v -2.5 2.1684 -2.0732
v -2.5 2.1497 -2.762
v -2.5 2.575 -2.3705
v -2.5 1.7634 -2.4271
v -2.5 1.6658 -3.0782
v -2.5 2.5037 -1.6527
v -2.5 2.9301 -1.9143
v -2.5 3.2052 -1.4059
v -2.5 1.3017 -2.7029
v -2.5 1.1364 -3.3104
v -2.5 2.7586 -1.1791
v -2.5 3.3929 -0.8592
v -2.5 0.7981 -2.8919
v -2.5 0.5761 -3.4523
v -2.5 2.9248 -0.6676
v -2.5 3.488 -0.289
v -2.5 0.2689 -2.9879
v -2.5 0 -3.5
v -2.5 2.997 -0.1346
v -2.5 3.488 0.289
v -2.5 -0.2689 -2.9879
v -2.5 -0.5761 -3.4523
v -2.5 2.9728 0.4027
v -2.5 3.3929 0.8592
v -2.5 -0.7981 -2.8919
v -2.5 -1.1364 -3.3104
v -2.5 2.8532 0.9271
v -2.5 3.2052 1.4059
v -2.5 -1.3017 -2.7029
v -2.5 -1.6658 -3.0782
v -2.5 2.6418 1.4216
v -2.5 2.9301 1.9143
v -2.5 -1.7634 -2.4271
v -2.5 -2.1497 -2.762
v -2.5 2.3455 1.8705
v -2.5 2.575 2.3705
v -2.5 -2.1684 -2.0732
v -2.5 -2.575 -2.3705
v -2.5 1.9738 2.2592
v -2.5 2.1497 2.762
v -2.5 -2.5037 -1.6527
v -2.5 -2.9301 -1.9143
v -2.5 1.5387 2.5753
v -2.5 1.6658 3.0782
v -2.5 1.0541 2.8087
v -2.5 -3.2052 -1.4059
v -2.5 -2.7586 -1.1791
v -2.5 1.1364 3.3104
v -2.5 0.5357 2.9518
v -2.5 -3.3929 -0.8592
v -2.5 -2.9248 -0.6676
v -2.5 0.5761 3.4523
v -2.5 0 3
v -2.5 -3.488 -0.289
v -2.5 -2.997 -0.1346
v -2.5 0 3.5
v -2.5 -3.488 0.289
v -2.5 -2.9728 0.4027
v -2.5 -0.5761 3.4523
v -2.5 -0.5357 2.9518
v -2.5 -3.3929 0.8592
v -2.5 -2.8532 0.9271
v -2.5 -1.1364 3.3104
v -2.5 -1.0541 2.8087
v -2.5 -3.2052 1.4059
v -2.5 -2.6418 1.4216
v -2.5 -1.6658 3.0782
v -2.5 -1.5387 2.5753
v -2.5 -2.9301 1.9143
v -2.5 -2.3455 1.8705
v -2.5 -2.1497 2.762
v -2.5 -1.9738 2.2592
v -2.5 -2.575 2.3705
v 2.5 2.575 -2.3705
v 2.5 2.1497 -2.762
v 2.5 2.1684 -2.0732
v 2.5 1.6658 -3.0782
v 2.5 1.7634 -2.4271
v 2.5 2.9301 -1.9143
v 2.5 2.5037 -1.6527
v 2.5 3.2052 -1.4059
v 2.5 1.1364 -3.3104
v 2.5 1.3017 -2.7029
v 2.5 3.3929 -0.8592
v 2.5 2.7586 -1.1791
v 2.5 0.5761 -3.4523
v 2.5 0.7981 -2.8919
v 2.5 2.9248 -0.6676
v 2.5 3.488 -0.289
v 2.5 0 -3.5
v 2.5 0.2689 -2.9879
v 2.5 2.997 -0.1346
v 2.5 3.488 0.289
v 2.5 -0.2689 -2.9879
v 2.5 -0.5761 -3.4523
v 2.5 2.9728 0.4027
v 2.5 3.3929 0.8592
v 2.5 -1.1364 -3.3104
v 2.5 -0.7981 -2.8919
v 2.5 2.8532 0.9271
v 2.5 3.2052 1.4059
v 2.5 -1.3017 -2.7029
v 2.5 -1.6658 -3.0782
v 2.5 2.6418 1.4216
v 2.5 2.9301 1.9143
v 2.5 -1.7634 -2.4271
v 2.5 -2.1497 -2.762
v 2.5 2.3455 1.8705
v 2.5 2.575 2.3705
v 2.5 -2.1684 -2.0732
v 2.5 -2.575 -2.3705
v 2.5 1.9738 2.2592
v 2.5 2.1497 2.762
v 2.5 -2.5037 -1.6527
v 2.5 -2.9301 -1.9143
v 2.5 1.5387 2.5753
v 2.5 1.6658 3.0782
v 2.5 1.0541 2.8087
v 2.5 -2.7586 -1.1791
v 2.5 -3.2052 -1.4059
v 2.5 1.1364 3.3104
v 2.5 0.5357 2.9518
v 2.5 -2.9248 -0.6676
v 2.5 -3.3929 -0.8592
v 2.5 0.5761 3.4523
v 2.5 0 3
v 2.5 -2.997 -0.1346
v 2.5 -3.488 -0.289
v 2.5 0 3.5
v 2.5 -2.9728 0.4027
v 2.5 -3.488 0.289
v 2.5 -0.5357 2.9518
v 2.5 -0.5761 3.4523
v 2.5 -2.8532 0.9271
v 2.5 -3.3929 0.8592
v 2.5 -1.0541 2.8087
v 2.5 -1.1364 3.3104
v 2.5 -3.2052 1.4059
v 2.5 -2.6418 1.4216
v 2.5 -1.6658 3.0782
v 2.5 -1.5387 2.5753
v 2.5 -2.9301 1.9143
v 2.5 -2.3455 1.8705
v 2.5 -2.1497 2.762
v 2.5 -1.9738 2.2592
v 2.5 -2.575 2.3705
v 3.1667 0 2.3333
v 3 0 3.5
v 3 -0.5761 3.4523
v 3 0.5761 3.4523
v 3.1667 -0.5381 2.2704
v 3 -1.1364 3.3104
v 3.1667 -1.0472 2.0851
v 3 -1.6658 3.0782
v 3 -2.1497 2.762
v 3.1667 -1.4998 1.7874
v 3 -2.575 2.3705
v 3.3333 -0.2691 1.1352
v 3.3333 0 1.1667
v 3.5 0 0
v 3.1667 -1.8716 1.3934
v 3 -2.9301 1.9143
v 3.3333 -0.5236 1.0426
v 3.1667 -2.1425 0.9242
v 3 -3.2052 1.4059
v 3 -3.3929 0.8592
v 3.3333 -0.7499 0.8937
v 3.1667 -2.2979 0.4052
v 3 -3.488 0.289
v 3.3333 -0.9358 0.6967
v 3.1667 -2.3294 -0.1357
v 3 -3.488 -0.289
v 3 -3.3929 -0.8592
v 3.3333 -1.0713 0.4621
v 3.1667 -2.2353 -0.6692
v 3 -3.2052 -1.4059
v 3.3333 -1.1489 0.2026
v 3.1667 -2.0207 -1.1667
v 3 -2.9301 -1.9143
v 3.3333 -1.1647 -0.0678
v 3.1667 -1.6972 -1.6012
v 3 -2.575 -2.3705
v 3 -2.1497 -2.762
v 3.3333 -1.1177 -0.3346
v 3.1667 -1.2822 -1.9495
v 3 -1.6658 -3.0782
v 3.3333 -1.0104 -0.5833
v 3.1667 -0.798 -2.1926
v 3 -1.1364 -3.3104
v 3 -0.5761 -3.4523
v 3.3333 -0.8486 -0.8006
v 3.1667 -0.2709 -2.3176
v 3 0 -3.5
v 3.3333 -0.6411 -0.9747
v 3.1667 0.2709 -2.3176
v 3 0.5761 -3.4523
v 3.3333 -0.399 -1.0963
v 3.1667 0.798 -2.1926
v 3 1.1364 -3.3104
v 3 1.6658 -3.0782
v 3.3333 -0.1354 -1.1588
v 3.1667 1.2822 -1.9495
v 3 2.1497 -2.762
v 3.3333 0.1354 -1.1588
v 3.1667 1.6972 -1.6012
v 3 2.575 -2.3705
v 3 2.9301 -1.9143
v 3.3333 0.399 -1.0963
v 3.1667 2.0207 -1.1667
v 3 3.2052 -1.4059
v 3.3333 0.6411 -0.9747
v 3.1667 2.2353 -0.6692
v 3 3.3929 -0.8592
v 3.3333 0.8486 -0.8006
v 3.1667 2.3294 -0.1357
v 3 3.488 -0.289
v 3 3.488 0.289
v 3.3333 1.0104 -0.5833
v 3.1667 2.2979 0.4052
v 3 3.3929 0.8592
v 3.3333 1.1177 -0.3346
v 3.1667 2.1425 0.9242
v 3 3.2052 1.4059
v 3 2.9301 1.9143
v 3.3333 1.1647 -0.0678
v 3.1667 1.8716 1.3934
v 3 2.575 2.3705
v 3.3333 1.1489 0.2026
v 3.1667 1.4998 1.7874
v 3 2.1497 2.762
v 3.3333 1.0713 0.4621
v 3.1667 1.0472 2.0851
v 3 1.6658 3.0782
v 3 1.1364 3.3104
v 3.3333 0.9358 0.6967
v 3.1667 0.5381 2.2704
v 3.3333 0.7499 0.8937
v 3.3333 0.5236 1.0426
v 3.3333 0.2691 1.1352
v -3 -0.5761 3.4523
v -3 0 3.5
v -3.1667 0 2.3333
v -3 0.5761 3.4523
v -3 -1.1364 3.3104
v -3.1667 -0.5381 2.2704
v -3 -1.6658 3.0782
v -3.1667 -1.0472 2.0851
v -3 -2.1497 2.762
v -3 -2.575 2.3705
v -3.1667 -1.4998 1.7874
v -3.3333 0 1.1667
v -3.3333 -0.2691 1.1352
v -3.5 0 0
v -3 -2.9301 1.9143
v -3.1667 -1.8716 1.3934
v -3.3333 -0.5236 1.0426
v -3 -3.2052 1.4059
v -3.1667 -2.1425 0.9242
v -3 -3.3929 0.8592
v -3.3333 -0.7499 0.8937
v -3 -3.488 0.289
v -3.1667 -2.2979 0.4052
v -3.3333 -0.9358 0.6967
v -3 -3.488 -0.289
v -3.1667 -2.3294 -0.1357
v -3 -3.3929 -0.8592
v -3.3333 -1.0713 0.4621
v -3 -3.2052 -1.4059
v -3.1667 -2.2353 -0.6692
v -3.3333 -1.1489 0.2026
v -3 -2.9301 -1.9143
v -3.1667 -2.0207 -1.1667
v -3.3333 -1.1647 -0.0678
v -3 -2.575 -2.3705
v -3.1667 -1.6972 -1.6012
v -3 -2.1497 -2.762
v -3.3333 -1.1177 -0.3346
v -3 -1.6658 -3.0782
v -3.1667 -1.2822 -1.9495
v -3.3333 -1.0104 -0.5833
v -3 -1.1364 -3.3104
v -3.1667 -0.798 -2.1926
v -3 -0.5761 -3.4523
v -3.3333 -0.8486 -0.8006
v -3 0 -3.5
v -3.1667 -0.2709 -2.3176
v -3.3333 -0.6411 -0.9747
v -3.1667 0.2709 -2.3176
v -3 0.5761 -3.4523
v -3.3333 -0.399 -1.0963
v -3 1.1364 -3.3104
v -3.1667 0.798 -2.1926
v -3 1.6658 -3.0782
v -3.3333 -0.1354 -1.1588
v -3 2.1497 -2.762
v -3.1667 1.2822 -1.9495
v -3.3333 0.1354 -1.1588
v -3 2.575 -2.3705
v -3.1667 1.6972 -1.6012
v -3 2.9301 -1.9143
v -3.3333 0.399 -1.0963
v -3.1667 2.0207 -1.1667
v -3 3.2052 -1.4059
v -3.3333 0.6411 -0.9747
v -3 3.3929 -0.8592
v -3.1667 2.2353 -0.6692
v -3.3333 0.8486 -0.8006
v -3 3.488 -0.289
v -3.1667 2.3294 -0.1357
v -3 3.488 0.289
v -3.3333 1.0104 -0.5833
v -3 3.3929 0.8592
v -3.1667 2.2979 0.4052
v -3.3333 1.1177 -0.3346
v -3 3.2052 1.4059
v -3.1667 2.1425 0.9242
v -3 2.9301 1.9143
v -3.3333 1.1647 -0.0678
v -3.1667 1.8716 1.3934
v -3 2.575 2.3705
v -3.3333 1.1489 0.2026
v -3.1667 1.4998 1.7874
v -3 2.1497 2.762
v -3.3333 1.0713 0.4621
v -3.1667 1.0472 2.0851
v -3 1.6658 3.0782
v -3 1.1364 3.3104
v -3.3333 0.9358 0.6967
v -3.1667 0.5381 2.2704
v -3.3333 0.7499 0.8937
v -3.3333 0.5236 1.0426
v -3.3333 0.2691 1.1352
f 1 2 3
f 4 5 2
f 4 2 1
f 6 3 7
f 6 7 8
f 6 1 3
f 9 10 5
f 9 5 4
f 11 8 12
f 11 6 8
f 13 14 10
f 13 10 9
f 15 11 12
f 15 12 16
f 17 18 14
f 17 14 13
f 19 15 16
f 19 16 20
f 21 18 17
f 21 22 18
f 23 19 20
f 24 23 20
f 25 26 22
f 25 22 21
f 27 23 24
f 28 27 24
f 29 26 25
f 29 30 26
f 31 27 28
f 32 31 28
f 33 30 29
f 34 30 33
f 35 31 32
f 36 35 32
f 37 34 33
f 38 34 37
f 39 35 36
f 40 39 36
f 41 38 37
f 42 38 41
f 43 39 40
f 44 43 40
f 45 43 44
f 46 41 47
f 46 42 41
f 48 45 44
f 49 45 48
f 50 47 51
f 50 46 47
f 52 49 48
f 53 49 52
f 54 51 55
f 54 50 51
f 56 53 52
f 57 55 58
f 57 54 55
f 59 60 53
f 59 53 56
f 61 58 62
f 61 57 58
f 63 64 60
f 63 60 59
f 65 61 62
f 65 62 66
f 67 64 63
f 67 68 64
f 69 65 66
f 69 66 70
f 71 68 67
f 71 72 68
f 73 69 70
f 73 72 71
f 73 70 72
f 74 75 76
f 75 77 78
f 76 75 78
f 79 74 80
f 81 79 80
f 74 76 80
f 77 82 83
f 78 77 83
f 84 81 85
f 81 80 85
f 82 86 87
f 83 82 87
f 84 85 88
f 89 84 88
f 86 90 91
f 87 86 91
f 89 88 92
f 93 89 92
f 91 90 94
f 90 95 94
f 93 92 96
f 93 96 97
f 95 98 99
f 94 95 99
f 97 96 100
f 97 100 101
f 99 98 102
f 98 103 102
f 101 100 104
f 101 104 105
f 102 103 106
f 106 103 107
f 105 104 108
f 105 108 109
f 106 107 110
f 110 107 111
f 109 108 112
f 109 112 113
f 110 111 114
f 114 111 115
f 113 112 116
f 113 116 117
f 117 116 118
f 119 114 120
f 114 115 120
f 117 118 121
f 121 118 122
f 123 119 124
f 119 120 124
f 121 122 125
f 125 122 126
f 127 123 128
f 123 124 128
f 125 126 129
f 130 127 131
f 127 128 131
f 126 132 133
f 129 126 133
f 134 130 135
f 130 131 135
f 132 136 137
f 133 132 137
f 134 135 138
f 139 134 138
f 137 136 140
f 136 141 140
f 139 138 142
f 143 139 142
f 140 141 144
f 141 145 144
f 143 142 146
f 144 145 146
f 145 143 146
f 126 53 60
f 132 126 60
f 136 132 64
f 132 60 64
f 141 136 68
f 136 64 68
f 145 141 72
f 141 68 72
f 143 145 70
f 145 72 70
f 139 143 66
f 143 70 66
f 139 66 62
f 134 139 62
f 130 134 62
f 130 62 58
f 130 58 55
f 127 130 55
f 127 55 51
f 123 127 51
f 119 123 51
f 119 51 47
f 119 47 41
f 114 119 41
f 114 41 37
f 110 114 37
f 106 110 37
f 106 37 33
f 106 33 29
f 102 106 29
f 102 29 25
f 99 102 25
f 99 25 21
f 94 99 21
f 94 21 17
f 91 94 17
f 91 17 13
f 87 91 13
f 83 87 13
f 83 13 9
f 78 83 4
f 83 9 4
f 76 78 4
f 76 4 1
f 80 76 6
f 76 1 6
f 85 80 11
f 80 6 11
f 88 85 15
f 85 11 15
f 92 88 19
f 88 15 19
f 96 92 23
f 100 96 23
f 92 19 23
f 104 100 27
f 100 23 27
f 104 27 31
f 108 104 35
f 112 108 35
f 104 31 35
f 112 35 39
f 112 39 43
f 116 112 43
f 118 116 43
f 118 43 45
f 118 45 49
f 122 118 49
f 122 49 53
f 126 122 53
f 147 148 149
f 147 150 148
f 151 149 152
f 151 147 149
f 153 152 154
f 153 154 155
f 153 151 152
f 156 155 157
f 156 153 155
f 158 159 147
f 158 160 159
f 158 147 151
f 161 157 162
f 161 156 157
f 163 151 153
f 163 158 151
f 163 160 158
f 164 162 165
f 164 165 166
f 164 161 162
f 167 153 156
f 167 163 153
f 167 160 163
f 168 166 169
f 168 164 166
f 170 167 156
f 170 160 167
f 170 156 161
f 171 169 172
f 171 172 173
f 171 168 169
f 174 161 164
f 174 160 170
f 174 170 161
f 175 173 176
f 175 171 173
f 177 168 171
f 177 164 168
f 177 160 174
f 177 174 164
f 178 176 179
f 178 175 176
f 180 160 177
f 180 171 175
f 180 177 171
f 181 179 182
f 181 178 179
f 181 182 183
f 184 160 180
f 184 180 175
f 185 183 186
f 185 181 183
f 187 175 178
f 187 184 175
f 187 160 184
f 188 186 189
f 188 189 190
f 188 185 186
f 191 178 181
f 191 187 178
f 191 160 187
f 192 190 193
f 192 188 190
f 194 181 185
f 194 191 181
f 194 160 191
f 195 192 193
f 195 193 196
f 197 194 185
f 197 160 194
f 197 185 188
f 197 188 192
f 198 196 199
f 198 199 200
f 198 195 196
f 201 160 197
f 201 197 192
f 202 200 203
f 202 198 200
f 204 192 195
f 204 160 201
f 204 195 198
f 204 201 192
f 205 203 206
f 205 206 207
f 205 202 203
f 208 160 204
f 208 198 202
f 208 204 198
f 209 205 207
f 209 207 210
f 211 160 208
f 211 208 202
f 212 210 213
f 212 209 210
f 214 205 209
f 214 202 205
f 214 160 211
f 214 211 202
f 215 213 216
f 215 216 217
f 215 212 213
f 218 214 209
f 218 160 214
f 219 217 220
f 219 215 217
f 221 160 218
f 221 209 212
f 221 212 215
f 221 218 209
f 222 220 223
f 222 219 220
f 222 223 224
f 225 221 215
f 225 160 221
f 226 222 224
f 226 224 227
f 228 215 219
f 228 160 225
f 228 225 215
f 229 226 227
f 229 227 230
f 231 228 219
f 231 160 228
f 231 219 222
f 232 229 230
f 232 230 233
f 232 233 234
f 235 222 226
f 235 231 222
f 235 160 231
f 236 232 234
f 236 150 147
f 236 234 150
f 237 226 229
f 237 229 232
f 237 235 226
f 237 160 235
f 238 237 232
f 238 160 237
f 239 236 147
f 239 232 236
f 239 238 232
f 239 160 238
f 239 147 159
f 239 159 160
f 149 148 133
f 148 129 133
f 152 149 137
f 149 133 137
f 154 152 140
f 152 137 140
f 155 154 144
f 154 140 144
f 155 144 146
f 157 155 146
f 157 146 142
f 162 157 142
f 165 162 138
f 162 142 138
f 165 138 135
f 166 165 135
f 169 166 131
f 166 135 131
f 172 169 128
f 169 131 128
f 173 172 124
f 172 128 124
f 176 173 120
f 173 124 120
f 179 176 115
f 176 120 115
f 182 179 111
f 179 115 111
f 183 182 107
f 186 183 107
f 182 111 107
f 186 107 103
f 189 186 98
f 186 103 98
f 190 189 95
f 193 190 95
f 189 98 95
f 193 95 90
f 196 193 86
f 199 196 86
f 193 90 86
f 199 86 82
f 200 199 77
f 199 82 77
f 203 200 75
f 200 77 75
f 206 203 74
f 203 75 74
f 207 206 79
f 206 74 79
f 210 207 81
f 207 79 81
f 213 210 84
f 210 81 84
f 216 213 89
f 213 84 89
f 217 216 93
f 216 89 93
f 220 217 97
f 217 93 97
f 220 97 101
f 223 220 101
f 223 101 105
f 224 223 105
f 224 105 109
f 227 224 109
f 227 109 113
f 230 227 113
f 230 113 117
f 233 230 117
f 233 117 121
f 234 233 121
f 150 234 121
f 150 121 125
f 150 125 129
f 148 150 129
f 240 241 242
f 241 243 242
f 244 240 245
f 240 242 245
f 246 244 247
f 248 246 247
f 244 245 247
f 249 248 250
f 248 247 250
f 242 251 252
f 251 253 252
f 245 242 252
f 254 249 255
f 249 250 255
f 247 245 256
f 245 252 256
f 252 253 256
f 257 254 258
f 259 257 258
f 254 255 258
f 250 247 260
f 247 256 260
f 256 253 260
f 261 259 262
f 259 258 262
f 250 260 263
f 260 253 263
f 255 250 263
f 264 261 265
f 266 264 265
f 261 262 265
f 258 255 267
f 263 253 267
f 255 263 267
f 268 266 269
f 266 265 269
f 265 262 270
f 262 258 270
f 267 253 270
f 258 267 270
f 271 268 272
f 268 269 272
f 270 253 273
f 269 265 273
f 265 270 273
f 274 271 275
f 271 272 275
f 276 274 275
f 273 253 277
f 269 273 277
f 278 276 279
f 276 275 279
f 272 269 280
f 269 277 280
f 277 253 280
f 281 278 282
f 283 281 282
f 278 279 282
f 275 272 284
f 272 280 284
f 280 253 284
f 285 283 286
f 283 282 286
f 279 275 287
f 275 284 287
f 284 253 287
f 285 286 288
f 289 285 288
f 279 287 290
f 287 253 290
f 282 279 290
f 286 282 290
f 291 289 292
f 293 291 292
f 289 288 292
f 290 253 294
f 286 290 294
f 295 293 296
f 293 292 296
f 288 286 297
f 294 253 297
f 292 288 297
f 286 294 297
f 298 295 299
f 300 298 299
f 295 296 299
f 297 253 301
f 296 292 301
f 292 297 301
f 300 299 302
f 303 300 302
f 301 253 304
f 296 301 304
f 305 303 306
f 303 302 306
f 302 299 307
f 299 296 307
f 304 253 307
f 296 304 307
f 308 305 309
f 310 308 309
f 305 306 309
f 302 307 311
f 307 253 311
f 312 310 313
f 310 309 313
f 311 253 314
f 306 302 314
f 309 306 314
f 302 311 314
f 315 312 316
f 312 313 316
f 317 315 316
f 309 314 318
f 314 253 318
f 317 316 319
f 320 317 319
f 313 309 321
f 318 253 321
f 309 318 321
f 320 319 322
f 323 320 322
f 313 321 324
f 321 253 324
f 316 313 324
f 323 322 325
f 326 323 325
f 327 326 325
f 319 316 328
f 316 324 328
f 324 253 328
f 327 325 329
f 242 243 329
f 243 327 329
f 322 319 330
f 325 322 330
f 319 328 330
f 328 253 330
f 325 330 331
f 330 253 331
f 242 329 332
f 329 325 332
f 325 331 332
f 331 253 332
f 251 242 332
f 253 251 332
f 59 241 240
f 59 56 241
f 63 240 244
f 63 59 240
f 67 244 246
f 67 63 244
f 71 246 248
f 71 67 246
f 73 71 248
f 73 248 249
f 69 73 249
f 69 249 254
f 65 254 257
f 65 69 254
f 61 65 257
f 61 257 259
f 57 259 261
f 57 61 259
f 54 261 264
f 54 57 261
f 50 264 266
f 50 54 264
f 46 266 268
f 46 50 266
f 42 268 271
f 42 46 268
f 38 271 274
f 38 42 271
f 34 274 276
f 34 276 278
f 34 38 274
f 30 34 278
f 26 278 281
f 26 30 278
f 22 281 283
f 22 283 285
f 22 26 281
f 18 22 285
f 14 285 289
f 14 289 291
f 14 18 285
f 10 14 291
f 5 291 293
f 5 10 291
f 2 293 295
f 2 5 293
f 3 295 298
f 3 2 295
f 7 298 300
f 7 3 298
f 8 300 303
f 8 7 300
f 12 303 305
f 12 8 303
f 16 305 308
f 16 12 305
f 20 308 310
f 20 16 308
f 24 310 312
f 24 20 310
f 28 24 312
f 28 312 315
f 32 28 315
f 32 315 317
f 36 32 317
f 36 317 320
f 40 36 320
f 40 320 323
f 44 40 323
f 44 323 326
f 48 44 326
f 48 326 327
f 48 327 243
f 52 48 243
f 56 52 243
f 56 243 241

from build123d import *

# Parameters (mm, degrees)
SKETCH_1_W = 2.5
SKETCH_1_H = 3


with BuildPart() as part:
    # 草图1 → 旋转1 (revolve)
    with BuildSketch(Plane.XY, mode=Mode.PRIVATE) as revolve_1_sk:
        with Locations((1.25, 1.5)):
            Rectangle(SKETCH_1_W, SKETCH_1_H)
        Polygon((3, 0), (3, 3.5), (2.5, 3.5), (2.5, 3), (2.5, 0), align=None)
        Polygon((3.5, 0), (3, 0), (3, 3.5), align=None)
    revolve_1 = revolve(revolve_1_sk.sketch.rotate(Axis((0, 0, 0), (1, 0, 0)), 90), axis=Axis((0, 0, 0), (1, 0, 0)))

    # 镜向1: 旋转1 across plane
    add(revolve_1.mirror(Plane.ZY))


solid = part.part
